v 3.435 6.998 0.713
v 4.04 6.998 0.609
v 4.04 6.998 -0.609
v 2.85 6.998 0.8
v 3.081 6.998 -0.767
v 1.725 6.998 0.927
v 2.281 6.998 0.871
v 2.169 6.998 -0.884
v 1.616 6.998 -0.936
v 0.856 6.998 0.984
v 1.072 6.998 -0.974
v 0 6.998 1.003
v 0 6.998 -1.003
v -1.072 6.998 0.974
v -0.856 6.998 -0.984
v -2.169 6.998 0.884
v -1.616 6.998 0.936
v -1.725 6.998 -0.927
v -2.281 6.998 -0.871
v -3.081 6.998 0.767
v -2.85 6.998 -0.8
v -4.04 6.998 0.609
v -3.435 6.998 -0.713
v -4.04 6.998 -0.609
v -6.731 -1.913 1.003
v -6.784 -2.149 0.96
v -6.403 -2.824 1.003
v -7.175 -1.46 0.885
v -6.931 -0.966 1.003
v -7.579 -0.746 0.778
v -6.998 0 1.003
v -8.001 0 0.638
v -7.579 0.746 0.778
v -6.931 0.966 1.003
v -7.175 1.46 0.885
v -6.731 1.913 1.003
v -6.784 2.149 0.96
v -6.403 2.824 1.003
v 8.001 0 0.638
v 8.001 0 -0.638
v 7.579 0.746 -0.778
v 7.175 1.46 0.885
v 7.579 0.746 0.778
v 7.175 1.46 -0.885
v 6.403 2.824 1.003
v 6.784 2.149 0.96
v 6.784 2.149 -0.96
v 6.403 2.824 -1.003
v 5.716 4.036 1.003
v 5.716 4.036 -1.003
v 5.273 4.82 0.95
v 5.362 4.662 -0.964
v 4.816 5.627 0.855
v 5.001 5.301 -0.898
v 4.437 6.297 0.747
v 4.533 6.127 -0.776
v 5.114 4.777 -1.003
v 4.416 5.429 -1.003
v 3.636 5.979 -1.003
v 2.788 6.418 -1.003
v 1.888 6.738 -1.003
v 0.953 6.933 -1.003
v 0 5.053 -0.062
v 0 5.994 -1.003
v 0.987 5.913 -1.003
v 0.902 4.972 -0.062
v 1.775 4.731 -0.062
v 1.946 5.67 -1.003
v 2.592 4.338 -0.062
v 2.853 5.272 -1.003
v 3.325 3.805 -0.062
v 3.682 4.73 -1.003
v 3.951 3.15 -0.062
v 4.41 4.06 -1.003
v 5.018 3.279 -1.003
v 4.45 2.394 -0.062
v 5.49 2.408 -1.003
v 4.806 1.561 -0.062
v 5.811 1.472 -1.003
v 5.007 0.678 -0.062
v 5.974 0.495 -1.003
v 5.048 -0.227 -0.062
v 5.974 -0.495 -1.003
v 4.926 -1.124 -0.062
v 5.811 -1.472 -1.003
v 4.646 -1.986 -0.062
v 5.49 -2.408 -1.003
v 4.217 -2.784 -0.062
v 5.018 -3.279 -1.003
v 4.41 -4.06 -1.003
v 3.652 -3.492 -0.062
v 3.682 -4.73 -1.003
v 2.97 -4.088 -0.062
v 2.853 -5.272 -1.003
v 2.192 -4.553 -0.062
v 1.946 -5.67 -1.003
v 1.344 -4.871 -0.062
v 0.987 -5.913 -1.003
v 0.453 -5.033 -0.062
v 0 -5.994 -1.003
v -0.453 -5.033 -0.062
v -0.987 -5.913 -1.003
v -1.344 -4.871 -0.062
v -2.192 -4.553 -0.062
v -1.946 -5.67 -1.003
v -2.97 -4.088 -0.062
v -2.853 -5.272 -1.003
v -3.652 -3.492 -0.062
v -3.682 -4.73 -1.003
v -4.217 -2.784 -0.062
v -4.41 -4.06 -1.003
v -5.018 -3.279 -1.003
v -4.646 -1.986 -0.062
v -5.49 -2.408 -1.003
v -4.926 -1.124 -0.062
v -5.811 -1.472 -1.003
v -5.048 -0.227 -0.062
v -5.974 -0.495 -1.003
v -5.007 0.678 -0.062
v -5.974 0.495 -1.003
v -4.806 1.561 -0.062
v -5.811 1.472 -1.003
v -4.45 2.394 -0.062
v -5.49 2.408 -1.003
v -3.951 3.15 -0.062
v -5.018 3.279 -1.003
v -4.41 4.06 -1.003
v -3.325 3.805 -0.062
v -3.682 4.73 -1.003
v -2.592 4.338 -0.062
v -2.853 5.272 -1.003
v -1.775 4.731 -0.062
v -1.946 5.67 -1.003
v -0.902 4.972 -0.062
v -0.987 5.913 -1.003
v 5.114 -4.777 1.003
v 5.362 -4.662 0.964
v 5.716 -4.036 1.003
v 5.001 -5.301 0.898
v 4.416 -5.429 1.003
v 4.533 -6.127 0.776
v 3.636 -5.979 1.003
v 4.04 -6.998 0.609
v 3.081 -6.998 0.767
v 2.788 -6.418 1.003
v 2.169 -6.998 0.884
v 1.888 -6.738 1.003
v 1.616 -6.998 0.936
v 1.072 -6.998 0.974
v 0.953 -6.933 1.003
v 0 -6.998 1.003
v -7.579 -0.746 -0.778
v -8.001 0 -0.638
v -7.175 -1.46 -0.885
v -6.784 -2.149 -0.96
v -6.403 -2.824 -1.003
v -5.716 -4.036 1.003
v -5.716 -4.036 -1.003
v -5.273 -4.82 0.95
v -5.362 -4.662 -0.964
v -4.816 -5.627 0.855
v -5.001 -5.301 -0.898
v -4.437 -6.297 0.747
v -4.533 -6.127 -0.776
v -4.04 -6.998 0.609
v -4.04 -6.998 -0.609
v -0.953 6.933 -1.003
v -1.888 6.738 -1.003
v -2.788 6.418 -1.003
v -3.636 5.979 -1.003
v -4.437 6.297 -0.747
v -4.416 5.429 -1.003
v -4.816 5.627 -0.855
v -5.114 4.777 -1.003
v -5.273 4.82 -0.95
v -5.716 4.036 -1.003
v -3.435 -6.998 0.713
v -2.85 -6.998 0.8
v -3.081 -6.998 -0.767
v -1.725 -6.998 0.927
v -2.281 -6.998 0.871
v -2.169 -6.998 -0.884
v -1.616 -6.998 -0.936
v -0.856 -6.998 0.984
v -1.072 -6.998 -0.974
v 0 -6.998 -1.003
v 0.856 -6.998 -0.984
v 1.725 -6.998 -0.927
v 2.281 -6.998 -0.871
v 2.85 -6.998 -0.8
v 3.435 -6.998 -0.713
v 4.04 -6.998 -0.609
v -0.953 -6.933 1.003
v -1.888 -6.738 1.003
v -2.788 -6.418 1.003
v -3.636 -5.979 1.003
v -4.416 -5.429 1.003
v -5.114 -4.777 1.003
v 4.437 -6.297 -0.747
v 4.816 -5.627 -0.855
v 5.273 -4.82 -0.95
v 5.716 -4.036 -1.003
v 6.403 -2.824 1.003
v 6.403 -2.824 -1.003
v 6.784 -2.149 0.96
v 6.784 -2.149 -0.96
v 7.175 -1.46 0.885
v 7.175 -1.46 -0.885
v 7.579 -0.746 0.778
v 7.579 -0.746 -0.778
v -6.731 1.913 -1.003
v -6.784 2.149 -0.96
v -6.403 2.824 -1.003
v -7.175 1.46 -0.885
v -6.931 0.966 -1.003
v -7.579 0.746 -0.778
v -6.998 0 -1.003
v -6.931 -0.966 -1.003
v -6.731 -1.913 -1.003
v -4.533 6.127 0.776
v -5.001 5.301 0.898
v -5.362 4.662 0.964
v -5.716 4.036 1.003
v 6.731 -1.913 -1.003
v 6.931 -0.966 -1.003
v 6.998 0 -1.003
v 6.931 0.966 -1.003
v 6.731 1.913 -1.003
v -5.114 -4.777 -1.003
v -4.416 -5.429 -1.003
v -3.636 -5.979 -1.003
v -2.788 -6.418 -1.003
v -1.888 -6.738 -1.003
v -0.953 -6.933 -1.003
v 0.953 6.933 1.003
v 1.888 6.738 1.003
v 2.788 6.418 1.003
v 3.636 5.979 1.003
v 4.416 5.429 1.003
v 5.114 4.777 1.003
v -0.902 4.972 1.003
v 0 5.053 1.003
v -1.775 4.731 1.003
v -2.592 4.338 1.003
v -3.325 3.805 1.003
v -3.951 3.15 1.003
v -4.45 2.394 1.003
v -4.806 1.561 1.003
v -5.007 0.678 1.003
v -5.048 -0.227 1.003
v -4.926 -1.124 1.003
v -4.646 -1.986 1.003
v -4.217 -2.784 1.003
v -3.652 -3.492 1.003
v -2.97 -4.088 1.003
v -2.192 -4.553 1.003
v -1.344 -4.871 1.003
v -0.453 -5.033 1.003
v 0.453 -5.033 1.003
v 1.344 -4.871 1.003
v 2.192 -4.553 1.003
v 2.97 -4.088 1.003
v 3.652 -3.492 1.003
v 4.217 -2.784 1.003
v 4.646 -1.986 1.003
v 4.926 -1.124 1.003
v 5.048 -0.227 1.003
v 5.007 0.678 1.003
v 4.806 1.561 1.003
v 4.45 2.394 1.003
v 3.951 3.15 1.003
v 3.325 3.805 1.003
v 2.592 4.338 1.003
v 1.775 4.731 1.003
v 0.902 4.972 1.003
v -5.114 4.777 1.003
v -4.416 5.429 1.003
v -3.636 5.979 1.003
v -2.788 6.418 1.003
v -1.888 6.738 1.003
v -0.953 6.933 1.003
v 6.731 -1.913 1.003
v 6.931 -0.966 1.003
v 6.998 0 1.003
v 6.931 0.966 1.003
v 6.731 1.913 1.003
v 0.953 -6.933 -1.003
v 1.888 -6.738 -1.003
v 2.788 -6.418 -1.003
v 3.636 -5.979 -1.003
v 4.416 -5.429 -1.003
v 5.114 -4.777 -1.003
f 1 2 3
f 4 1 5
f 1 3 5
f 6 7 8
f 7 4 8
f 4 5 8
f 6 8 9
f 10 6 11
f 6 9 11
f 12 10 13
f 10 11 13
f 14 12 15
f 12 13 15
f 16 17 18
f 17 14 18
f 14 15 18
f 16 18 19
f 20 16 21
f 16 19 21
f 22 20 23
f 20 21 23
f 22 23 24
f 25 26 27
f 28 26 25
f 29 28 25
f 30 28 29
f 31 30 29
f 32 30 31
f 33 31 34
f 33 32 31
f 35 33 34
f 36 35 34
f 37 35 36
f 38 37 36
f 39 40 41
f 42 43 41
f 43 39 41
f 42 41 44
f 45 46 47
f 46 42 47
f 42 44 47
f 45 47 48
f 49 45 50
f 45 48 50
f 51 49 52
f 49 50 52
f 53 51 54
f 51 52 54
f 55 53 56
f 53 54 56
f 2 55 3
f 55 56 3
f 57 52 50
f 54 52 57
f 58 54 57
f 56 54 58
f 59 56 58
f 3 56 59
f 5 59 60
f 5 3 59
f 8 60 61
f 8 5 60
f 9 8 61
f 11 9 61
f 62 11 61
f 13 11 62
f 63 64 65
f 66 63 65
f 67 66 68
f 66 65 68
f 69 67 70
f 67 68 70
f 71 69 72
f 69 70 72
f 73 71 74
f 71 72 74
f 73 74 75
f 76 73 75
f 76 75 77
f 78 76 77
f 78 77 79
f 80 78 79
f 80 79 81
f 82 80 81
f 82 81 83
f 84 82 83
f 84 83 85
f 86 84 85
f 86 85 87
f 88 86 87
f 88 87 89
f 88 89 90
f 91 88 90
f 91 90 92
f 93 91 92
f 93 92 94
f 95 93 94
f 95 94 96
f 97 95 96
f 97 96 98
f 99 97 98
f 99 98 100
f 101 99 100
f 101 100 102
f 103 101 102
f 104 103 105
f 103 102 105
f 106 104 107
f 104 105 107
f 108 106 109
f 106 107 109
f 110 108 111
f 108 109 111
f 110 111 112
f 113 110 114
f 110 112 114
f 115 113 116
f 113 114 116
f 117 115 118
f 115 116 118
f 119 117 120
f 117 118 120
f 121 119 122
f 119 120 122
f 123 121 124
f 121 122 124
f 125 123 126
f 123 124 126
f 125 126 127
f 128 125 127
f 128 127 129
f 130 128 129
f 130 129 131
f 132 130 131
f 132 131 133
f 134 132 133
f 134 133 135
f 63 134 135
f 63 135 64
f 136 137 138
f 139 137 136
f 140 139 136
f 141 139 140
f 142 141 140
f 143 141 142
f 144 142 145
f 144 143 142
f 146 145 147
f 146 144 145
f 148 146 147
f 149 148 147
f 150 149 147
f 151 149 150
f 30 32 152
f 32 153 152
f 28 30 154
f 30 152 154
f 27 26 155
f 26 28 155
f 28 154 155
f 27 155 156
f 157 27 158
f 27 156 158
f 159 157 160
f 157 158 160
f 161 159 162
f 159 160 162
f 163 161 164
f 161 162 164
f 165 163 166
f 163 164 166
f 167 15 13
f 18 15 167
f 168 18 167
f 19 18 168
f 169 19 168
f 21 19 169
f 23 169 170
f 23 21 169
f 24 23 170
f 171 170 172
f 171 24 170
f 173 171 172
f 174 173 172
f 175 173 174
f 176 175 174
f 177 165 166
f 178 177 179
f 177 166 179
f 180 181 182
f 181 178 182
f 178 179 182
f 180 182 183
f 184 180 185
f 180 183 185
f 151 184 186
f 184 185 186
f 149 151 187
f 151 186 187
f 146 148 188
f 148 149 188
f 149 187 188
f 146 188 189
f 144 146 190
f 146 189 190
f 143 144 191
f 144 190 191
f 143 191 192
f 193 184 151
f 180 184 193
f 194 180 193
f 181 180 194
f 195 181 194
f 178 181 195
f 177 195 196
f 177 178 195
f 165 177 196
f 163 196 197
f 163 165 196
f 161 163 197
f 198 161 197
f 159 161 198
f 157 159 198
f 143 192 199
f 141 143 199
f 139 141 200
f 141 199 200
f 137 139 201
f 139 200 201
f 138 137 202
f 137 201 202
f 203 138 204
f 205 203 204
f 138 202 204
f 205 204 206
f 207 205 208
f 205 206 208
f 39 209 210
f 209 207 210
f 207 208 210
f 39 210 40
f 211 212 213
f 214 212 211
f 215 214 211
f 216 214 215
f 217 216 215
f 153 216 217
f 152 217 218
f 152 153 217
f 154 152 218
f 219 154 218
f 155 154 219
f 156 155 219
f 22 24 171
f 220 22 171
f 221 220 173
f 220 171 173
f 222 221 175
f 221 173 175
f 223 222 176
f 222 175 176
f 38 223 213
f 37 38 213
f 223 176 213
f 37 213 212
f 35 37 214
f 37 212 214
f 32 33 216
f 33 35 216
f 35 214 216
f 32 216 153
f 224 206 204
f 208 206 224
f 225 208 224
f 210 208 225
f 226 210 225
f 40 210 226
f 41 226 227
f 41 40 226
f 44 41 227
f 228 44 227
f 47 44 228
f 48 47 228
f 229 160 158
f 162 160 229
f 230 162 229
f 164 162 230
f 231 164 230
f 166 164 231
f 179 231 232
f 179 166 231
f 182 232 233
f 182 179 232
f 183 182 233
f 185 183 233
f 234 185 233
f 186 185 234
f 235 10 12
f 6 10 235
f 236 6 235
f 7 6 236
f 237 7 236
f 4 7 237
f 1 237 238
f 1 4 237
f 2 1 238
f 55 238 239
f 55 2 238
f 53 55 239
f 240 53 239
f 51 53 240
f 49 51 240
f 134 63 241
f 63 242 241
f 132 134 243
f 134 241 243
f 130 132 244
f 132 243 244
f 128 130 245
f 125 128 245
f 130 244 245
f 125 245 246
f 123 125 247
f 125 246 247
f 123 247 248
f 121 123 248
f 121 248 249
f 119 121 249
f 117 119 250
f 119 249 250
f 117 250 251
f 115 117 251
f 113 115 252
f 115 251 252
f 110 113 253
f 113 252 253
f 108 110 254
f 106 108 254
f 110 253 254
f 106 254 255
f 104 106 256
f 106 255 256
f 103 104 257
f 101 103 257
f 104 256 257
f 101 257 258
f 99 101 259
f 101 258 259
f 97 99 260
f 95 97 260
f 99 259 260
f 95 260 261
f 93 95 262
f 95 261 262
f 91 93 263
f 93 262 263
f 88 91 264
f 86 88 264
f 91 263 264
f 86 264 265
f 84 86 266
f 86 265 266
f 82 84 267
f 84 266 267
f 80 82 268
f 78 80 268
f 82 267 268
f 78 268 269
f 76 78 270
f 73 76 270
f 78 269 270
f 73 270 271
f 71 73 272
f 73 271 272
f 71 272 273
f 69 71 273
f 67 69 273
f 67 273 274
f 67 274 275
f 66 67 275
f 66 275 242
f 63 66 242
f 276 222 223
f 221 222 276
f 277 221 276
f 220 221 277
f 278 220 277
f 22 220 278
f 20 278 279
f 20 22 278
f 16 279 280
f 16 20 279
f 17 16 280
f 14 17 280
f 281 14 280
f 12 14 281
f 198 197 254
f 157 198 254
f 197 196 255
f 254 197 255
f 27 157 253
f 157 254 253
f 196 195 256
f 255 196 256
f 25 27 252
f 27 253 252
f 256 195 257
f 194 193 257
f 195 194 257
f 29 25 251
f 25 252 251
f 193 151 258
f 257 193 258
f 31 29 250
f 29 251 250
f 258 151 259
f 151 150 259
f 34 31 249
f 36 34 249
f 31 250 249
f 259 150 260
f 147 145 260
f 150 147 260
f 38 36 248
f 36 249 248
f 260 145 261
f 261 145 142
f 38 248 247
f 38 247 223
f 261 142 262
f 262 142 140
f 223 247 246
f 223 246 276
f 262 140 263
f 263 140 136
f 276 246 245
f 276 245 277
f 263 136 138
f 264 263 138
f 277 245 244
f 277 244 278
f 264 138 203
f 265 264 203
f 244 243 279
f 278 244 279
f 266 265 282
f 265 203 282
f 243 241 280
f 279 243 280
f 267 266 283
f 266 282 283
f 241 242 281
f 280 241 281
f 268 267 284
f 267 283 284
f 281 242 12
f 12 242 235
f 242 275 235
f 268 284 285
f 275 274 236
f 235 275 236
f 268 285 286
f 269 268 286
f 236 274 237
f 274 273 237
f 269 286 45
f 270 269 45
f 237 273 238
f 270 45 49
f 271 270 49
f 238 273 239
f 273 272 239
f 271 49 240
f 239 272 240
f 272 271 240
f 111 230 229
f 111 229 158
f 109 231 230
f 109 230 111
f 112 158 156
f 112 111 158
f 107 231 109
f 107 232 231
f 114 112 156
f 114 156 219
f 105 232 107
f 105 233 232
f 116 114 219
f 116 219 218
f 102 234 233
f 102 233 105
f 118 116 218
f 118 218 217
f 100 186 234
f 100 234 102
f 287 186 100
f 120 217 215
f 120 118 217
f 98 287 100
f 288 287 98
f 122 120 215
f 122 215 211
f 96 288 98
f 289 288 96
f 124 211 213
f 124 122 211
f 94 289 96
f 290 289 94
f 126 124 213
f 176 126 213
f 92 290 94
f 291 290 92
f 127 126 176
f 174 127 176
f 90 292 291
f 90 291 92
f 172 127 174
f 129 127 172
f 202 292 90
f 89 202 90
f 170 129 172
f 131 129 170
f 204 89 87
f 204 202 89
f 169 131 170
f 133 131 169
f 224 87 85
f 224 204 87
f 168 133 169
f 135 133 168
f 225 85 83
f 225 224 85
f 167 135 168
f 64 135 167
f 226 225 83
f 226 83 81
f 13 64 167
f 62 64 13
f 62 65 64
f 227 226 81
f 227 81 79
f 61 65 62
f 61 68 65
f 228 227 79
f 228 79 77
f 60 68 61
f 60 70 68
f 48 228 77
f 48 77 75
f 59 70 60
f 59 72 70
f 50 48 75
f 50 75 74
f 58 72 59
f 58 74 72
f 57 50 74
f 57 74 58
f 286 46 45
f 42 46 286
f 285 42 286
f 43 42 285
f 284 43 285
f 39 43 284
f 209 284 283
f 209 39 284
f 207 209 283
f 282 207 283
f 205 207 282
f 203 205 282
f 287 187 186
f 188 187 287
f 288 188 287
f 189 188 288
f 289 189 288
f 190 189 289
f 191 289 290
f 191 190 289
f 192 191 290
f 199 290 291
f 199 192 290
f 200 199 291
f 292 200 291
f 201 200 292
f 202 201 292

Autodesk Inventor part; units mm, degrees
sketch "Sketch_1" plane through (0, 0, 0) normal (1, 0, 0) x (0, 1, 0)
  line L0 (0, -1.0033) -> (0, 1.0033)
  line L1 (0, 1.0033) -> (6.9977, 1.0033)
  line L2 (6.9977, 1.0033) -> (8.3972, 0.4939)
  line L3 (8.3972, 0.4939) -> (8.3972, -0.4939)
  line L4 (8.3972, -0.4939) -> (6.9977, -1.0033)
  line L5 (6.9977, -1.0033) -> (0, -1.0033)
  line L6 (0, -1.0033) -> (0, 1.0033)
revolve "Revolution1" add sketch "Sketch_1" angle 360 about axis through (0, 0, -1.0033) along (0, 0, -1)
sketch "Sketch_2" plane through (0, 0, 0) normal (0, 0, 1) x (1, 0, 0)
  line L0 (-13.9954, 13.9954) -> (-13.9954, -13.9954)
  line L1 (-13.9954, -13.9954) -> (13.9954, -13.9954)
  line L2 (13.9954, -13.9954) -> (13.9954, 13.9954)
  line L3 (13.9954, 13.9954) -> (-13.9954, 13.9954)
  line L4 (-8.001, 0) -> (-4.0401, -6.9977)
  line L5 (-4.0401, -6.9977) -> (4.0401, -6.9977)
  line L6 (4.0401, -6.9977) -> (8.001, 0)
  line L7 (8.001, 0) -> (4.0401, 6.9977)
  line L8 (4.0401, 6.9977) -> (-4.0401, 6.9977)
  line L9 (-4.0401, 6.9977) -> (-8.001, 0)
extrude "Extrusion1" cut sketch "Sketch_2" along normal mid plane 4.0132
sketch "Sketch3" plane through (0, 0, -1.0033) normal (0, 0, -1) x (-1, 0, 0)
  point P0 (0, 0)
hole "Drilling 1" at (0, 0, -1.0033) direction (0, 0, 1) diameter 10.106 depth 2.0066 countersink diameter 11.9888 countersink angle 90
ref_plane "nut_XY" through (0, 0, 1.0033) normal (0, 0, 1) x (1, 0, 0)
ref_plane "nut_YZ" through (0, 0, 1.0033) normal (1, 0, 0) x (0, 1, 0)
ref_plane "nut_ZX" through (0, 0, 1.0033) normal (0, 1, 0) x (0, 0, 1)
properties part number "AT527M"
